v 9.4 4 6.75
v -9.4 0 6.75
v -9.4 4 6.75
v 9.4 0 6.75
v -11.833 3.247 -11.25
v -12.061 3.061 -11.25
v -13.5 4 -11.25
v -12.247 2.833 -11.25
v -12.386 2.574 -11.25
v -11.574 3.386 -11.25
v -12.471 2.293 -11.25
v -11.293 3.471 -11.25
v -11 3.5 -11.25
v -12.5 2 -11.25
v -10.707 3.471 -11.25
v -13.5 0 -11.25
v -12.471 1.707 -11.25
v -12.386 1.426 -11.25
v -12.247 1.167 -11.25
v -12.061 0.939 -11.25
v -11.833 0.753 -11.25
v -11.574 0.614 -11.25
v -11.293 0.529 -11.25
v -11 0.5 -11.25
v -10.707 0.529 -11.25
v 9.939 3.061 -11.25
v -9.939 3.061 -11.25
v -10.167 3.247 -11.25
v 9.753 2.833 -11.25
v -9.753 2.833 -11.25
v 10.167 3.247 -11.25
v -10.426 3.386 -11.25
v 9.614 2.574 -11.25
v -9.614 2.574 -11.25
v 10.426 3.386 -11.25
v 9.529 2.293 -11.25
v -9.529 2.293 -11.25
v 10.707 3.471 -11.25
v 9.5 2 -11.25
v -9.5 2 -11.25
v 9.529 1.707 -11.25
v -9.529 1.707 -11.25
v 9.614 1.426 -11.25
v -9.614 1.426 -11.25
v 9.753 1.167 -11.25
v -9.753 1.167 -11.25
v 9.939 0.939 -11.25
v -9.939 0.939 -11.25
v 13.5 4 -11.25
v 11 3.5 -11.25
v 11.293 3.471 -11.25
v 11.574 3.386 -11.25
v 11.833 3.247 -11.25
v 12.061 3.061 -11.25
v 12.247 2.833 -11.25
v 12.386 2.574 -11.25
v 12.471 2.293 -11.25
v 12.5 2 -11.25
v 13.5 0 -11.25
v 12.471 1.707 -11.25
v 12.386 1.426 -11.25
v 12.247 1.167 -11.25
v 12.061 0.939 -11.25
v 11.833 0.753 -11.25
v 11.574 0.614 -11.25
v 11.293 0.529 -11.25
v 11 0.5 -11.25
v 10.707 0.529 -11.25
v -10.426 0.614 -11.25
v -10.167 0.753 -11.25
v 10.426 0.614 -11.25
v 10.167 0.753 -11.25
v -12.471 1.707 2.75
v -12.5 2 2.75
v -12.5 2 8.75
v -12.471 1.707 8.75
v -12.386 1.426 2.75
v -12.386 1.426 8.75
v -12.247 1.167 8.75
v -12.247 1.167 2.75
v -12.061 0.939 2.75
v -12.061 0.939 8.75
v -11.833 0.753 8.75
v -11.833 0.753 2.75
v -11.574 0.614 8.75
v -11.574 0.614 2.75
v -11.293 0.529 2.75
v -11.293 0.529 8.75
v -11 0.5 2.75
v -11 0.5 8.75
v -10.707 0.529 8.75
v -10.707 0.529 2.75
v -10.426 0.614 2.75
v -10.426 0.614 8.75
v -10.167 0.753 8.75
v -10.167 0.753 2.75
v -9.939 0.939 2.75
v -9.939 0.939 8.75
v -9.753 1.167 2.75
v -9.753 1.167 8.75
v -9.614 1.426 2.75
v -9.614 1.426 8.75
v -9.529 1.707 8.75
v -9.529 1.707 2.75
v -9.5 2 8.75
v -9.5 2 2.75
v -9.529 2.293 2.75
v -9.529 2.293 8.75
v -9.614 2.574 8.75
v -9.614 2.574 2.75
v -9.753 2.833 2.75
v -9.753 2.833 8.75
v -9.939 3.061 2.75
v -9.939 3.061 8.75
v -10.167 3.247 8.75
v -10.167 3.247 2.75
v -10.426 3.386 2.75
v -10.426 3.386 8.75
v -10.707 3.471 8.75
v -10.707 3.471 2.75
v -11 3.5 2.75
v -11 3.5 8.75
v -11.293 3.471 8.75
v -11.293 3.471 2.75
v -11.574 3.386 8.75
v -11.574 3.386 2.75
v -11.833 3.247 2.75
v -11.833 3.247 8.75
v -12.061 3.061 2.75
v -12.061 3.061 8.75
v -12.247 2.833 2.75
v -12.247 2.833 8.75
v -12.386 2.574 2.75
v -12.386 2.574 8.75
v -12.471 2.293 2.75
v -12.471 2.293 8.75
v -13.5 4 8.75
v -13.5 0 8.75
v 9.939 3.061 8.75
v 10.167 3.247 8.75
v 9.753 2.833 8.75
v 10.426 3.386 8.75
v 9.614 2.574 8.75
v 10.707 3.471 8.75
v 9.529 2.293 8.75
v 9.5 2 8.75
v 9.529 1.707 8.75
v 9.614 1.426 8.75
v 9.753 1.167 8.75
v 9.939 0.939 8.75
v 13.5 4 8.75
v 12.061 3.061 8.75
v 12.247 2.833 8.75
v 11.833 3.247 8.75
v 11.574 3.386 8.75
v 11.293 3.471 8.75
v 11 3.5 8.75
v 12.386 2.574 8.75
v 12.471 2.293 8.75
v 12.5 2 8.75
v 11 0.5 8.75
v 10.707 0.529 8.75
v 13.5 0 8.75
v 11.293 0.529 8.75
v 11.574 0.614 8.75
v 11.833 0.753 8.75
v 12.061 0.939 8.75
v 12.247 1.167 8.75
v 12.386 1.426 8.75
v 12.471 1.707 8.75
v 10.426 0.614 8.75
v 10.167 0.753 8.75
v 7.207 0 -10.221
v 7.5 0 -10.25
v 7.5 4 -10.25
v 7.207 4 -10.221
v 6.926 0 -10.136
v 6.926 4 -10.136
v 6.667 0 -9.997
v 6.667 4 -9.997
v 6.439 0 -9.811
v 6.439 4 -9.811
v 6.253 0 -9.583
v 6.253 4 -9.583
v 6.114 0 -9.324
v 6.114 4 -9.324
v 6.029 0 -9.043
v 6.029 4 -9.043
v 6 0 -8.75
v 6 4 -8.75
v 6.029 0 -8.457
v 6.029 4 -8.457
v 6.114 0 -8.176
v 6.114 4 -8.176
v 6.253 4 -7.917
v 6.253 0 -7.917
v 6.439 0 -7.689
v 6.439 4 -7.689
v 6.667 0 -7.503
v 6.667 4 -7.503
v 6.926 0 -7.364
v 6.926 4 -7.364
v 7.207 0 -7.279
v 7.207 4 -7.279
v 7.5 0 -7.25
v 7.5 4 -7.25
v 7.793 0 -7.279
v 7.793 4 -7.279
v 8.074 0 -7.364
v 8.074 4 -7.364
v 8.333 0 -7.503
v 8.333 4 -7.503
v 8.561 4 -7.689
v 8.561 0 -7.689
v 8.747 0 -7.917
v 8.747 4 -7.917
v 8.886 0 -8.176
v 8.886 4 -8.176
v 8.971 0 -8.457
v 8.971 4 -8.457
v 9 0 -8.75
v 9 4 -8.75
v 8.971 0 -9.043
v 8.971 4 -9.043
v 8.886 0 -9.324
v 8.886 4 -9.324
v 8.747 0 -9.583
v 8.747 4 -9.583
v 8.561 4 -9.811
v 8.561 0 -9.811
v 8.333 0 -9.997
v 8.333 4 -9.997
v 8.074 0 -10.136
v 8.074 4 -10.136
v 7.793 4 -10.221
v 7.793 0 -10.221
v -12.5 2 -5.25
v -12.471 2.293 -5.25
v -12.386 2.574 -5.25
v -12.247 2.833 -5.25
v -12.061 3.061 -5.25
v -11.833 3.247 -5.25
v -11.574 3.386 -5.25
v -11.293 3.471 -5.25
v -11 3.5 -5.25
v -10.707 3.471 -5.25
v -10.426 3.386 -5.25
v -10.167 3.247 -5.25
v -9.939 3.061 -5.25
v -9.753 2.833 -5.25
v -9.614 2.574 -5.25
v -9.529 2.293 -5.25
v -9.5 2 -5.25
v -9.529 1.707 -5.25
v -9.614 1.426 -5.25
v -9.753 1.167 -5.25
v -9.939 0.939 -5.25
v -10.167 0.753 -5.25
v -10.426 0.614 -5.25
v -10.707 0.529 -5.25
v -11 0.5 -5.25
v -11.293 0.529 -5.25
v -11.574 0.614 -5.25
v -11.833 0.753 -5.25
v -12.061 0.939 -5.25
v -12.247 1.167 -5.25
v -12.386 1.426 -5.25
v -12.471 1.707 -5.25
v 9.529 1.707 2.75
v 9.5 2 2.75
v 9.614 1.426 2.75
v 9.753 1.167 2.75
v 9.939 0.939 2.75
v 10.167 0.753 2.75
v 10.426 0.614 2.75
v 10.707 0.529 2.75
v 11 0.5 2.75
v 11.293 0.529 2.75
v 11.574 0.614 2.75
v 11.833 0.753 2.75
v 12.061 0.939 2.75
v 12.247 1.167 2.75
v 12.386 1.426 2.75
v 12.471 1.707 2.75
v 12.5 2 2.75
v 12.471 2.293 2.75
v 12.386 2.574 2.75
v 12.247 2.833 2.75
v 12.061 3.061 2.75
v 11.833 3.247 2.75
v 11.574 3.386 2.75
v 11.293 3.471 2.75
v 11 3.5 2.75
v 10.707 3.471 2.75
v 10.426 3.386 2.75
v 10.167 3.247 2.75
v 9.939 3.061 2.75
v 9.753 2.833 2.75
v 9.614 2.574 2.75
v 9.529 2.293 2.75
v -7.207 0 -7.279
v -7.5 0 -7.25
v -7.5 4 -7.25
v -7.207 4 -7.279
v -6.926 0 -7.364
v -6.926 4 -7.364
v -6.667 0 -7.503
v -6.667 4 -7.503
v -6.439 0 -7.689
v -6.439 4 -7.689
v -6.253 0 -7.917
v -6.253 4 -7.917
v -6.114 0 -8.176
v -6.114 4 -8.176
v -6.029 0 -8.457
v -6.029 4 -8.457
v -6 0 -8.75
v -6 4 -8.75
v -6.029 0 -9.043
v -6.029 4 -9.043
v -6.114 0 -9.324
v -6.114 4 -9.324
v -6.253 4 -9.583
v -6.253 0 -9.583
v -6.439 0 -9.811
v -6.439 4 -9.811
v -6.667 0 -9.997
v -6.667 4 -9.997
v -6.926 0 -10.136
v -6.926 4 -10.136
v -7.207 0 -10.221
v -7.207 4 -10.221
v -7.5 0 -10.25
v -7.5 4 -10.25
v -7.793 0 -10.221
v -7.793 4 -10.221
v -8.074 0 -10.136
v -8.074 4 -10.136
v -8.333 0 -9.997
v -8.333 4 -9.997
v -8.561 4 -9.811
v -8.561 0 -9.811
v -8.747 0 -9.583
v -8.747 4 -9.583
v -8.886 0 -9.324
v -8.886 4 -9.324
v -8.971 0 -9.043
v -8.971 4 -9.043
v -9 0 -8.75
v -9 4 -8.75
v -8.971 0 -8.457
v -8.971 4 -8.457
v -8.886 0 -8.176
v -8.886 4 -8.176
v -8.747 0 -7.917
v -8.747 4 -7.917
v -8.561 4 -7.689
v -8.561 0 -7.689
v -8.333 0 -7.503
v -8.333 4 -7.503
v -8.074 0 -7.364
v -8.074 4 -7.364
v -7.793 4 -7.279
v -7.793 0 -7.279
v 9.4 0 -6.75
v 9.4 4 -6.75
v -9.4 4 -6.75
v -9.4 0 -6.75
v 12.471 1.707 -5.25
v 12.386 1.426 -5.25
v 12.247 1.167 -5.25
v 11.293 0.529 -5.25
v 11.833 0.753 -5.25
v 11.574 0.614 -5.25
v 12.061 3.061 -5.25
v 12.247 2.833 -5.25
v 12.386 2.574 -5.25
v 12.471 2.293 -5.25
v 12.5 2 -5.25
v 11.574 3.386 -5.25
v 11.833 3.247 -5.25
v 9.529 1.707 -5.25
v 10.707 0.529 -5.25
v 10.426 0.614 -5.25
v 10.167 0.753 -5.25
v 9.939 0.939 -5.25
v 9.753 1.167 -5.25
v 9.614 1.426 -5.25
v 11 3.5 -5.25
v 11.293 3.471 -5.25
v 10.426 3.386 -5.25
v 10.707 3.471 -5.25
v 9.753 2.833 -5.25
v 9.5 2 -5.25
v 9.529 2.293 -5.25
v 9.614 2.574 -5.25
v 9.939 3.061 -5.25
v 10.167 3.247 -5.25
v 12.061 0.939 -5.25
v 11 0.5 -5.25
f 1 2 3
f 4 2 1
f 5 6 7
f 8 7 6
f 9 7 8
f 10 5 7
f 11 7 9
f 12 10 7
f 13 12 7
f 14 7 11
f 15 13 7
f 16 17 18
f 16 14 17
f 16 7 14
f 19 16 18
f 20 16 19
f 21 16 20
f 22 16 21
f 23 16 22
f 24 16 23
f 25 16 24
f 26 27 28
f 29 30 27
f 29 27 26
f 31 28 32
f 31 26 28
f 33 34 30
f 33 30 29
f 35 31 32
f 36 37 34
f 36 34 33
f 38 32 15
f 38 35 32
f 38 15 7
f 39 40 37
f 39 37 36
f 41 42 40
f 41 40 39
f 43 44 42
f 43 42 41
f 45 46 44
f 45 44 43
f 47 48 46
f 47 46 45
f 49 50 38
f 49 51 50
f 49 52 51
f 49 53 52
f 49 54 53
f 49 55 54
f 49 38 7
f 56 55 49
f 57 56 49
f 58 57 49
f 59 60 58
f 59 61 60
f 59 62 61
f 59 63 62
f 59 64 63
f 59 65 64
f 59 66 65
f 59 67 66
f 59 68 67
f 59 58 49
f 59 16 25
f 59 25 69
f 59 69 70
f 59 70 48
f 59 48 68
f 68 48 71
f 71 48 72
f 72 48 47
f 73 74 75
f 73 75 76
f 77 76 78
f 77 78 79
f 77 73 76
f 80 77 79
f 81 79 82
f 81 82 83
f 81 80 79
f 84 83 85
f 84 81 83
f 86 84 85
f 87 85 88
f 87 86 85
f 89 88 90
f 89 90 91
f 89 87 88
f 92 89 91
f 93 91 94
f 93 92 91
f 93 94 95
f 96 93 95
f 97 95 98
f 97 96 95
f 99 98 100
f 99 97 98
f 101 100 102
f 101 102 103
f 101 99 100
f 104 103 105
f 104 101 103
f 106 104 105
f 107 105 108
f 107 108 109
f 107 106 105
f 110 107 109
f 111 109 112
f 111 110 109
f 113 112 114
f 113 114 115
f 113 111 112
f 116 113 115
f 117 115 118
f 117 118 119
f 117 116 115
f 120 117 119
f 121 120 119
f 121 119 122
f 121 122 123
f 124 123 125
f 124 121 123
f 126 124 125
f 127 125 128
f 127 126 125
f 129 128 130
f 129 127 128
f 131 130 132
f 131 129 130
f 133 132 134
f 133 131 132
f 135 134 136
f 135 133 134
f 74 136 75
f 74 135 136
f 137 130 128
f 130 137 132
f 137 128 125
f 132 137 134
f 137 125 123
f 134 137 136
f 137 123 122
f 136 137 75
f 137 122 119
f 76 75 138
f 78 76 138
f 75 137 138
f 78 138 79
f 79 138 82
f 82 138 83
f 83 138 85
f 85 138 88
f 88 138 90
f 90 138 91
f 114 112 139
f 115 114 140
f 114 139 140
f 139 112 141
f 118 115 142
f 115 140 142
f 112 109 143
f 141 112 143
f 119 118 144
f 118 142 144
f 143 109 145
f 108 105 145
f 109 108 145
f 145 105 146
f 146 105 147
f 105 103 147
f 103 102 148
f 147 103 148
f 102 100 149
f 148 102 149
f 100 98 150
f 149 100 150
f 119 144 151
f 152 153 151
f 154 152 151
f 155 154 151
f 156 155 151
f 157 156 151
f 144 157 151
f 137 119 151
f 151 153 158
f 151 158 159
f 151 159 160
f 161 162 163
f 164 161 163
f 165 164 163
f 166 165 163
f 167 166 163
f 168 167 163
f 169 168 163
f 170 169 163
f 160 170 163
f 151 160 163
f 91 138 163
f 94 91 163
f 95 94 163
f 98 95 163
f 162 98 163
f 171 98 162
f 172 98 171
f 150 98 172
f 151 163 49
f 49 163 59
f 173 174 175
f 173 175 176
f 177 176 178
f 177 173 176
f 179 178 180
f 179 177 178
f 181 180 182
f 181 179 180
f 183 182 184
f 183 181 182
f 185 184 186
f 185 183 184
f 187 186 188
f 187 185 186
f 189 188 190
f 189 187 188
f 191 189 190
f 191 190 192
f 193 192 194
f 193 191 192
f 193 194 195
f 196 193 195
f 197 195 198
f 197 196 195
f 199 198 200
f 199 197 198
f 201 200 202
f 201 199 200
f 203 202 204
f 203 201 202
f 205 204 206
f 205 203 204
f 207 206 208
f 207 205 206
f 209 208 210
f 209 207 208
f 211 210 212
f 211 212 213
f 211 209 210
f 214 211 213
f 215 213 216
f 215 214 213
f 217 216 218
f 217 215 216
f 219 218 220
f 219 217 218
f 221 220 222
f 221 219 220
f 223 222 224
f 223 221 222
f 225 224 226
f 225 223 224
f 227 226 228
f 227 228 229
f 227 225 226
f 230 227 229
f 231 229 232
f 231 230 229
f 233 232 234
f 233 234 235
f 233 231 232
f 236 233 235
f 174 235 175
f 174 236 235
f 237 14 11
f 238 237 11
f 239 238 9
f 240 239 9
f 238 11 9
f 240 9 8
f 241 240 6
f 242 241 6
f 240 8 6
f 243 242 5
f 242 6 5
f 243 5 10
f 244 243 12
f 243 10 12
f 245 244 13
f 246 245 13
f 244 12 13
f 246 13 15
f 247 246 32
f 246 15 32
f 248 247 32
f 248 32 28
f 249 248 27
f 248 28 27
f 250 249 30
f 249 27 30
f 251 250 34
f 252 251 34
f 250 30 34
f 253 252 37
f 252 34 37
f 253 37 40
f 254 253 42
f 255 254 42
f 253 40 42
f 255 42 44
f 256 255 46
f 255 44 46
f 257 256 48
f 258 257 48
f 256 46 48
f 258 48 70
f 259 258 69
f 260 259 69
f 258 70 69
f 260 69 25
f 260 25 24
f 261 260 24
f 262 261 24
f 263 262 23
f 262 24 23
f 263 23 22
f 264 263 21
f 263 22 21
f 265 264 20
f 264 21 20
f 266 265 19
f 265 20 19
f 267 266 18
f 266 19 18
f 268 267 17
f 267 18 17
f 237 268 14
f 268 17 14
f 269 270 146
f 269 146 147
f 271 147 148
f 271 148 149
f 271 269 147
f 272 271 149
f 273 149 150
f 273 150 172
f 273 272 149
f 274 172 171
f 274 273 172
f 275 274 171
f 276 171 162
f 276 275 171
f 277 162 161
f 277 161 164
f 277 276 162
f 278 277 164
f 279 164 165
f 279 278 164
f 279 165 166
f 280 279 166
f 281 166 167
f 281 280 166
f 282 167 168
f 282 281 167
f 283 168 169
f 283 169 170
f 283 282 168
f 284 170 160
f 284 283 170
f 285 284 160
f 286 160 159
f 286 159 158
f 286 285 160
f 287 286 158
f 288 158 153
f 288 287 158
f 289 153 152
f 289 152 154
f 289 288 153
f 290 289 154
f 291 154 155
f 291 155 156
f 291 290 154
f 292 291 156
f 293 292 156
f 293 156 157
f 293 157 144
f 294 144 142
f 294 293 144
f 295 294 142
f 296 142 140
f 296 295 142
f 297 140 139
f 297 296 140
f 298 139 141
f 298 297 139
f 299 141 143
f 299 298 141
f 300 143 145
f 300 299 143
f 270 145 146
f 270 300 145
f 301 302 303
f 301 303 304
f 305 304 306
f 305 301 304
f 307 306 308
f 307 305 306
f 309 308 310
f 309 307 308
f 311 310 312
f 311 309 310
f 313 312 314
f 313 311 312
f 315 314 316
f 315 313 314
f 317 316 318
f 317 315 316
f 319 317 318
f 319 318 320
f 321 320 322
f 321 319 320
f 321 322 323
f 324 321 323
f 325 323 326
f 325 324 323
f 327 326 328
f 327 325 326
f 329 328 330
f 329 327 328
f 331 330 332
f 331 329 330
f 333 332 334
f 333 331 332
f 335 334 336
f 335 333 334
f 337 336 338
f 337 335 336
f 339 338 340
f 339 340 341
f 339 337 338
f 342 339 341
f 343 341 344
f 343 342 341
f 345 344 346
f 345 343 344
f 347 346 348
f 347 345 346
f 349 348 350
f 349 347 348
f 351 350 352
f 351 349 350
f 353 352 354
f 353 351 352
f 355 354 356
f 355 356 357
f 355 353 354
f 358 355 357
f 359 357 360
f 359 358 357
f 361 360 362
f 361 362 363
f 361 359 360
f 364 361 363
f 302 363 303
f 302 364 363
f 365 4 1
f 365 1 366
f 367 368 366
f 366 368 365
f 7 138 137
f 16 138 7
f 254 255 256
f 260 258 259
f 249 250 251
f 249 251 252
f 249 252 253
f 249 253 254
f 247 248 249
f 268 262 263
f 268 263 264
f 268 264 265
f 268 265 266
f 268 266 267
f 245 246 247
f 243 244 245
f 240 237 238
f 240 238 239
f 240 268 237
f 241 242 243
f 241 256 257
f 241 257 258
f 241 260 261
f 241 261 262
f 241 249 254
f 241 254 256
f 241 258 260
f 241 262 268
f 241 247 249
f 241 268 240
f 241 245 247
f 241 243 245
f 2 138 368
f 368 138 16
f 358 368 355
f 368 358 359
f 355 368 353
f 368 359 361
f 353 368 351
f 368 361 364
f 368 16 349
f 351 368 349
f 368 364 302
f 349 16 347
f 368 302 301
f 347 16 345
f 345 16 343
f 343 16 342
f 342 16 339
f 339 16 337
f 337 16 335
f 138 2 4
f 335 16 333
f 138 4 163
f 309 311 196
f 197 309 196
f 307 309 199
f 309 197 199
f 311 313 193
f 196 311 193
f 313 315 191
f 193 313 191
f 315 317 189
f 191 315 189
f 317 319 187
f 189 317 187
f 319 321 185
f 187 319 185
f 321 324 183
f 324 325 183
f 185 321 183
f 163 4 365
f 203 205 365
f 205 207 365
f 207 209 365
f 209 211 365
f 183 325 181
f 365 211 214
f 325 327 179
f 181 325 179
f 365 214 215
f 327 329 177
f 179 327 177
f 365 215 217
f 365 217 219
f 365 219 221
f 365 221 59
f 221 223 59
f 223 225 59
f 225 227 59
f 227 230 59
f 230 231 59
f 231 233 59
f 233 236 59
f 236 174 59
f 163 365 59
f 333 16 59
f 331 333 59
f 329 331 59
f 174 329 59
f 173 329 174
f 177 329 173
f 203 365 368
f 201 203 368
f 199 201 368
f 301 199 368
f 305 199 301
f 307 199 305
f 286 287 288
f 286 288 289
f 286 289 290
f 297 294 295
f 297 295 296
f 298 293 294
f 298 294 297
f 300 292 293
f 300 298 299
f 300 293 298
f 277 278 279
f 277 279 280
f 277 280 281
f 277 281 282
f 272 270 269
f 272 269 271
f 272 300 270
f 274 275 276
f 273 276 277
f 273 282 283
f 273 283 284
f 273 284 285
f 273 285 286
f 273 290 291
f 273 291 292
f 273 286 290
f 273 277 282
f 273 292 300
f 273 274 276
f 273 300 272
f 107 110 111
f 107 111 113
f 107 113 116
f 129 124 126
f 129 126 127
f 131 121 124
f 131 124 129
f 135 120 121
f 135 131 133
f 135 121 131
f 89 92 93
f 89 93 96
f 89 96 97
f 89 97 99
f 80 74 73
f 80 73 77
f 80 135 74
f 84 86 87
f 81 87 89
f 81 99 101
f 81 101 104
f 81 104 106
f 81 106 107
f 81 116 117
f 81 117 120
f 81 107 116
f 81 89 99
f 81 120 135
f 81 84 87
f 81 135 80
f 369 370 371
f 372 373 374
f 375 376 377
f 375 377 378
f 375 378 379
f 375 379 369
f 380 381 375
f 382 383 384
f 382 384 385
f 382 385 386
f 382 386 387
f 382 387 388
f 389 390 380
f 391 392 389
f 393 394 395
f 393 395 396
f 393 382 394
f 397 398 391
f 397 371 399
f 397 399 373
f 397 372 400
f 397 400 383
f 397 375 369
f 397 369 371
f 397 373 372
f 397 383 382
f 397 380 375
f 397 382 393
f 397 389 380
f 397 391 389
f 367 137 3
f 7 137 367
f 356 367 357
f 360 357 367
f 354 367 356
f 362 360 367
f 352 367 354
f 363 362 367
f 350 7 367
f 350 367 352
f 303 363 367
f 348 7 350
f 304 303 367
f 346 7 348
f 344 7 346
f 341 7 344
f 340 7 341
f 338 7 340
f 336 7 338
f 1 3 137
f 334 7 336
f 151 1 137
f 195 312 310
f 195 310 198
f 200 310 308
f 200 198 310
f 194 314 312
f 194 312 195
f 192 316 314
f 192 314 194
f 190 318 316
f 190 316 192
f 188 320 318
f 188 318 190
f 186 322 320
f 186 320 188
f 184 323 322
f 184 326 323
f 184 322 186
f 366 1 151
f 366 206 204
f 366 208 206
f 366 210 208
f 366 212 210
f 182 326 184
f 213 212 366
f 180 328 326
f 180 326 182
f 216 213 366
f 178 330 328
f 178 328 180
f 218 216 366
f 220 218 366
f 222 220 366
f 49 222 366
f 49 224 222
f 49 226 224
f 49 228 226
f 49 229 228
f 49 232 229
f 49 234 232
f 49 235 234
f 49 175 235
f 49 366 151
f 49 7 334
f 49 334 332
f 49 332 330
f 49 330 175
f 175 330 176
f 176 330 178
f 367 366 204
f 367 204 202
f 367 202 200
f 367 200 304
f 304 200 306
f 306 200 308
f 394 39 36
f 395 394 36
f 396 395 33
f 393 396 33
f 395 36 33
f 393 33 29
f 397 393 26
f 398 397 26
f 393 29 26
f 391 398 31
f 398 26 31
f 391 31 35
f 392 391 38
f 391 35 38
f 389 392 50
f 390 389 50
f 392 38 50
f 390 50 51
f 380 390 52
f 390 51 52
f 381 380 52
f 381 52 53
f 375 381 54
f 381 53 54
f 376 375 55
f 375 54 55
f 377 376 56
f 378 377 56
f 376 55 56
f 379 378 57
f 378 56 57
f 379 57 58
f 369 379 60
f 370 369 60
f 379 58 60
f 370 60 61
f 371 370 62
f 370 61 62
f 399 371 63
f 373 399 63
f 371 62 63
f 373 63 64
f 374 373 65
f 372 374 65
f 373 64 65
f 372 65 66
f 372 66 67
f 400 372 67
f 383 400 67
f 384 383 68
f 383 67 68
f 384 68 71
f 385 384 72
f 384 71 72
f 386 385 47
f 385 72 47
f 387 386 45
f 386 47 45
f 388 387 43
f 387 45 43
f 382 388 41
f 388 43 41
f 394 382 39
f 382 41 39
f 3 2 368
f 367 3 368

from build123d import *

# Parameters (mm, degrees)
SKETCH1_W           = 27
SKETCH1_H           = 20
SKETCH1_R           = 1.5
SKETCH1_W_2         = 18.8
SKETCH1_H_2         = 13.5
BOSS_EXTRUDE1_DEPTH = 4
SKETCH2_R           = 1.5
CUT_EXTRUDE2_DEPTH  = 6
CUT_EXTRUDE3_START  = -6
SKETCH5_R           = 1.5
CUT_EXTRUDE3_DEPTH  = 6


with BuildPart() as part:
    # Sketch1 → Boss-Extrude1 (new body)
    with BuildSketch(Plane(origin=(0, 0, 0), x_dir=(1, 0, 0), z_dir=(0, 1, 0))):
        with Locations((0, 1.25)):
            Rectangle(SKETCH1_W, SKETCH1_H)
        with Locations(Location((-7.5, 8.75, 0), (0, 0, 270))):
            Circle(SKETCH1_R, mode=Mode.SUBTRACT)
        with Locations(Location((7.5, 8.75, 0), (0, 0, 90))):
            Circle(SKETCH1_R, mode=Mode.SUBTRACT)
        Rectangle(SKETCH1_W_2, SKETCH1_H_2, mode=Mode.SUBTRACT)
    extrude(amount=BOSS_EXTRUDE1_DEPTH)

    # Sketch2 → Cut-Extrude2 (cut)
    with BuildSketch(Plane(origin=(0, 0, -11.25), x_dir=(-1, 0, 0), z_dir=(0, 0, -1))):
        with Locations((11, 2)):
            Circle(SKETCH2_R)
        with Locations((-11, 2)):
            Circle(SKETCH2_R)
    extrude(amount=-CUT_EXTRUDE2_DEPTH, mode=Mode.SUBTRACT)

    # Sketch5 → Cut-Extrude3 (cut)
    with BuildSketch(Plane.XY.offset(8.75).offset(CUT_EXTRUDE3_START)):
        with Locations(Location((11, 2, 0), (0, 0, 180))):
            Circle(SKETCH5_R)
        with Locations(Location((-11, 2, 0), (0, 0, 180))):
            Circle(SKETCH5_R)
    extrude(amount=CUT_EXTRUDE3_DEPTH, mode=Mode.SUBTRACT)


solid = part.part
